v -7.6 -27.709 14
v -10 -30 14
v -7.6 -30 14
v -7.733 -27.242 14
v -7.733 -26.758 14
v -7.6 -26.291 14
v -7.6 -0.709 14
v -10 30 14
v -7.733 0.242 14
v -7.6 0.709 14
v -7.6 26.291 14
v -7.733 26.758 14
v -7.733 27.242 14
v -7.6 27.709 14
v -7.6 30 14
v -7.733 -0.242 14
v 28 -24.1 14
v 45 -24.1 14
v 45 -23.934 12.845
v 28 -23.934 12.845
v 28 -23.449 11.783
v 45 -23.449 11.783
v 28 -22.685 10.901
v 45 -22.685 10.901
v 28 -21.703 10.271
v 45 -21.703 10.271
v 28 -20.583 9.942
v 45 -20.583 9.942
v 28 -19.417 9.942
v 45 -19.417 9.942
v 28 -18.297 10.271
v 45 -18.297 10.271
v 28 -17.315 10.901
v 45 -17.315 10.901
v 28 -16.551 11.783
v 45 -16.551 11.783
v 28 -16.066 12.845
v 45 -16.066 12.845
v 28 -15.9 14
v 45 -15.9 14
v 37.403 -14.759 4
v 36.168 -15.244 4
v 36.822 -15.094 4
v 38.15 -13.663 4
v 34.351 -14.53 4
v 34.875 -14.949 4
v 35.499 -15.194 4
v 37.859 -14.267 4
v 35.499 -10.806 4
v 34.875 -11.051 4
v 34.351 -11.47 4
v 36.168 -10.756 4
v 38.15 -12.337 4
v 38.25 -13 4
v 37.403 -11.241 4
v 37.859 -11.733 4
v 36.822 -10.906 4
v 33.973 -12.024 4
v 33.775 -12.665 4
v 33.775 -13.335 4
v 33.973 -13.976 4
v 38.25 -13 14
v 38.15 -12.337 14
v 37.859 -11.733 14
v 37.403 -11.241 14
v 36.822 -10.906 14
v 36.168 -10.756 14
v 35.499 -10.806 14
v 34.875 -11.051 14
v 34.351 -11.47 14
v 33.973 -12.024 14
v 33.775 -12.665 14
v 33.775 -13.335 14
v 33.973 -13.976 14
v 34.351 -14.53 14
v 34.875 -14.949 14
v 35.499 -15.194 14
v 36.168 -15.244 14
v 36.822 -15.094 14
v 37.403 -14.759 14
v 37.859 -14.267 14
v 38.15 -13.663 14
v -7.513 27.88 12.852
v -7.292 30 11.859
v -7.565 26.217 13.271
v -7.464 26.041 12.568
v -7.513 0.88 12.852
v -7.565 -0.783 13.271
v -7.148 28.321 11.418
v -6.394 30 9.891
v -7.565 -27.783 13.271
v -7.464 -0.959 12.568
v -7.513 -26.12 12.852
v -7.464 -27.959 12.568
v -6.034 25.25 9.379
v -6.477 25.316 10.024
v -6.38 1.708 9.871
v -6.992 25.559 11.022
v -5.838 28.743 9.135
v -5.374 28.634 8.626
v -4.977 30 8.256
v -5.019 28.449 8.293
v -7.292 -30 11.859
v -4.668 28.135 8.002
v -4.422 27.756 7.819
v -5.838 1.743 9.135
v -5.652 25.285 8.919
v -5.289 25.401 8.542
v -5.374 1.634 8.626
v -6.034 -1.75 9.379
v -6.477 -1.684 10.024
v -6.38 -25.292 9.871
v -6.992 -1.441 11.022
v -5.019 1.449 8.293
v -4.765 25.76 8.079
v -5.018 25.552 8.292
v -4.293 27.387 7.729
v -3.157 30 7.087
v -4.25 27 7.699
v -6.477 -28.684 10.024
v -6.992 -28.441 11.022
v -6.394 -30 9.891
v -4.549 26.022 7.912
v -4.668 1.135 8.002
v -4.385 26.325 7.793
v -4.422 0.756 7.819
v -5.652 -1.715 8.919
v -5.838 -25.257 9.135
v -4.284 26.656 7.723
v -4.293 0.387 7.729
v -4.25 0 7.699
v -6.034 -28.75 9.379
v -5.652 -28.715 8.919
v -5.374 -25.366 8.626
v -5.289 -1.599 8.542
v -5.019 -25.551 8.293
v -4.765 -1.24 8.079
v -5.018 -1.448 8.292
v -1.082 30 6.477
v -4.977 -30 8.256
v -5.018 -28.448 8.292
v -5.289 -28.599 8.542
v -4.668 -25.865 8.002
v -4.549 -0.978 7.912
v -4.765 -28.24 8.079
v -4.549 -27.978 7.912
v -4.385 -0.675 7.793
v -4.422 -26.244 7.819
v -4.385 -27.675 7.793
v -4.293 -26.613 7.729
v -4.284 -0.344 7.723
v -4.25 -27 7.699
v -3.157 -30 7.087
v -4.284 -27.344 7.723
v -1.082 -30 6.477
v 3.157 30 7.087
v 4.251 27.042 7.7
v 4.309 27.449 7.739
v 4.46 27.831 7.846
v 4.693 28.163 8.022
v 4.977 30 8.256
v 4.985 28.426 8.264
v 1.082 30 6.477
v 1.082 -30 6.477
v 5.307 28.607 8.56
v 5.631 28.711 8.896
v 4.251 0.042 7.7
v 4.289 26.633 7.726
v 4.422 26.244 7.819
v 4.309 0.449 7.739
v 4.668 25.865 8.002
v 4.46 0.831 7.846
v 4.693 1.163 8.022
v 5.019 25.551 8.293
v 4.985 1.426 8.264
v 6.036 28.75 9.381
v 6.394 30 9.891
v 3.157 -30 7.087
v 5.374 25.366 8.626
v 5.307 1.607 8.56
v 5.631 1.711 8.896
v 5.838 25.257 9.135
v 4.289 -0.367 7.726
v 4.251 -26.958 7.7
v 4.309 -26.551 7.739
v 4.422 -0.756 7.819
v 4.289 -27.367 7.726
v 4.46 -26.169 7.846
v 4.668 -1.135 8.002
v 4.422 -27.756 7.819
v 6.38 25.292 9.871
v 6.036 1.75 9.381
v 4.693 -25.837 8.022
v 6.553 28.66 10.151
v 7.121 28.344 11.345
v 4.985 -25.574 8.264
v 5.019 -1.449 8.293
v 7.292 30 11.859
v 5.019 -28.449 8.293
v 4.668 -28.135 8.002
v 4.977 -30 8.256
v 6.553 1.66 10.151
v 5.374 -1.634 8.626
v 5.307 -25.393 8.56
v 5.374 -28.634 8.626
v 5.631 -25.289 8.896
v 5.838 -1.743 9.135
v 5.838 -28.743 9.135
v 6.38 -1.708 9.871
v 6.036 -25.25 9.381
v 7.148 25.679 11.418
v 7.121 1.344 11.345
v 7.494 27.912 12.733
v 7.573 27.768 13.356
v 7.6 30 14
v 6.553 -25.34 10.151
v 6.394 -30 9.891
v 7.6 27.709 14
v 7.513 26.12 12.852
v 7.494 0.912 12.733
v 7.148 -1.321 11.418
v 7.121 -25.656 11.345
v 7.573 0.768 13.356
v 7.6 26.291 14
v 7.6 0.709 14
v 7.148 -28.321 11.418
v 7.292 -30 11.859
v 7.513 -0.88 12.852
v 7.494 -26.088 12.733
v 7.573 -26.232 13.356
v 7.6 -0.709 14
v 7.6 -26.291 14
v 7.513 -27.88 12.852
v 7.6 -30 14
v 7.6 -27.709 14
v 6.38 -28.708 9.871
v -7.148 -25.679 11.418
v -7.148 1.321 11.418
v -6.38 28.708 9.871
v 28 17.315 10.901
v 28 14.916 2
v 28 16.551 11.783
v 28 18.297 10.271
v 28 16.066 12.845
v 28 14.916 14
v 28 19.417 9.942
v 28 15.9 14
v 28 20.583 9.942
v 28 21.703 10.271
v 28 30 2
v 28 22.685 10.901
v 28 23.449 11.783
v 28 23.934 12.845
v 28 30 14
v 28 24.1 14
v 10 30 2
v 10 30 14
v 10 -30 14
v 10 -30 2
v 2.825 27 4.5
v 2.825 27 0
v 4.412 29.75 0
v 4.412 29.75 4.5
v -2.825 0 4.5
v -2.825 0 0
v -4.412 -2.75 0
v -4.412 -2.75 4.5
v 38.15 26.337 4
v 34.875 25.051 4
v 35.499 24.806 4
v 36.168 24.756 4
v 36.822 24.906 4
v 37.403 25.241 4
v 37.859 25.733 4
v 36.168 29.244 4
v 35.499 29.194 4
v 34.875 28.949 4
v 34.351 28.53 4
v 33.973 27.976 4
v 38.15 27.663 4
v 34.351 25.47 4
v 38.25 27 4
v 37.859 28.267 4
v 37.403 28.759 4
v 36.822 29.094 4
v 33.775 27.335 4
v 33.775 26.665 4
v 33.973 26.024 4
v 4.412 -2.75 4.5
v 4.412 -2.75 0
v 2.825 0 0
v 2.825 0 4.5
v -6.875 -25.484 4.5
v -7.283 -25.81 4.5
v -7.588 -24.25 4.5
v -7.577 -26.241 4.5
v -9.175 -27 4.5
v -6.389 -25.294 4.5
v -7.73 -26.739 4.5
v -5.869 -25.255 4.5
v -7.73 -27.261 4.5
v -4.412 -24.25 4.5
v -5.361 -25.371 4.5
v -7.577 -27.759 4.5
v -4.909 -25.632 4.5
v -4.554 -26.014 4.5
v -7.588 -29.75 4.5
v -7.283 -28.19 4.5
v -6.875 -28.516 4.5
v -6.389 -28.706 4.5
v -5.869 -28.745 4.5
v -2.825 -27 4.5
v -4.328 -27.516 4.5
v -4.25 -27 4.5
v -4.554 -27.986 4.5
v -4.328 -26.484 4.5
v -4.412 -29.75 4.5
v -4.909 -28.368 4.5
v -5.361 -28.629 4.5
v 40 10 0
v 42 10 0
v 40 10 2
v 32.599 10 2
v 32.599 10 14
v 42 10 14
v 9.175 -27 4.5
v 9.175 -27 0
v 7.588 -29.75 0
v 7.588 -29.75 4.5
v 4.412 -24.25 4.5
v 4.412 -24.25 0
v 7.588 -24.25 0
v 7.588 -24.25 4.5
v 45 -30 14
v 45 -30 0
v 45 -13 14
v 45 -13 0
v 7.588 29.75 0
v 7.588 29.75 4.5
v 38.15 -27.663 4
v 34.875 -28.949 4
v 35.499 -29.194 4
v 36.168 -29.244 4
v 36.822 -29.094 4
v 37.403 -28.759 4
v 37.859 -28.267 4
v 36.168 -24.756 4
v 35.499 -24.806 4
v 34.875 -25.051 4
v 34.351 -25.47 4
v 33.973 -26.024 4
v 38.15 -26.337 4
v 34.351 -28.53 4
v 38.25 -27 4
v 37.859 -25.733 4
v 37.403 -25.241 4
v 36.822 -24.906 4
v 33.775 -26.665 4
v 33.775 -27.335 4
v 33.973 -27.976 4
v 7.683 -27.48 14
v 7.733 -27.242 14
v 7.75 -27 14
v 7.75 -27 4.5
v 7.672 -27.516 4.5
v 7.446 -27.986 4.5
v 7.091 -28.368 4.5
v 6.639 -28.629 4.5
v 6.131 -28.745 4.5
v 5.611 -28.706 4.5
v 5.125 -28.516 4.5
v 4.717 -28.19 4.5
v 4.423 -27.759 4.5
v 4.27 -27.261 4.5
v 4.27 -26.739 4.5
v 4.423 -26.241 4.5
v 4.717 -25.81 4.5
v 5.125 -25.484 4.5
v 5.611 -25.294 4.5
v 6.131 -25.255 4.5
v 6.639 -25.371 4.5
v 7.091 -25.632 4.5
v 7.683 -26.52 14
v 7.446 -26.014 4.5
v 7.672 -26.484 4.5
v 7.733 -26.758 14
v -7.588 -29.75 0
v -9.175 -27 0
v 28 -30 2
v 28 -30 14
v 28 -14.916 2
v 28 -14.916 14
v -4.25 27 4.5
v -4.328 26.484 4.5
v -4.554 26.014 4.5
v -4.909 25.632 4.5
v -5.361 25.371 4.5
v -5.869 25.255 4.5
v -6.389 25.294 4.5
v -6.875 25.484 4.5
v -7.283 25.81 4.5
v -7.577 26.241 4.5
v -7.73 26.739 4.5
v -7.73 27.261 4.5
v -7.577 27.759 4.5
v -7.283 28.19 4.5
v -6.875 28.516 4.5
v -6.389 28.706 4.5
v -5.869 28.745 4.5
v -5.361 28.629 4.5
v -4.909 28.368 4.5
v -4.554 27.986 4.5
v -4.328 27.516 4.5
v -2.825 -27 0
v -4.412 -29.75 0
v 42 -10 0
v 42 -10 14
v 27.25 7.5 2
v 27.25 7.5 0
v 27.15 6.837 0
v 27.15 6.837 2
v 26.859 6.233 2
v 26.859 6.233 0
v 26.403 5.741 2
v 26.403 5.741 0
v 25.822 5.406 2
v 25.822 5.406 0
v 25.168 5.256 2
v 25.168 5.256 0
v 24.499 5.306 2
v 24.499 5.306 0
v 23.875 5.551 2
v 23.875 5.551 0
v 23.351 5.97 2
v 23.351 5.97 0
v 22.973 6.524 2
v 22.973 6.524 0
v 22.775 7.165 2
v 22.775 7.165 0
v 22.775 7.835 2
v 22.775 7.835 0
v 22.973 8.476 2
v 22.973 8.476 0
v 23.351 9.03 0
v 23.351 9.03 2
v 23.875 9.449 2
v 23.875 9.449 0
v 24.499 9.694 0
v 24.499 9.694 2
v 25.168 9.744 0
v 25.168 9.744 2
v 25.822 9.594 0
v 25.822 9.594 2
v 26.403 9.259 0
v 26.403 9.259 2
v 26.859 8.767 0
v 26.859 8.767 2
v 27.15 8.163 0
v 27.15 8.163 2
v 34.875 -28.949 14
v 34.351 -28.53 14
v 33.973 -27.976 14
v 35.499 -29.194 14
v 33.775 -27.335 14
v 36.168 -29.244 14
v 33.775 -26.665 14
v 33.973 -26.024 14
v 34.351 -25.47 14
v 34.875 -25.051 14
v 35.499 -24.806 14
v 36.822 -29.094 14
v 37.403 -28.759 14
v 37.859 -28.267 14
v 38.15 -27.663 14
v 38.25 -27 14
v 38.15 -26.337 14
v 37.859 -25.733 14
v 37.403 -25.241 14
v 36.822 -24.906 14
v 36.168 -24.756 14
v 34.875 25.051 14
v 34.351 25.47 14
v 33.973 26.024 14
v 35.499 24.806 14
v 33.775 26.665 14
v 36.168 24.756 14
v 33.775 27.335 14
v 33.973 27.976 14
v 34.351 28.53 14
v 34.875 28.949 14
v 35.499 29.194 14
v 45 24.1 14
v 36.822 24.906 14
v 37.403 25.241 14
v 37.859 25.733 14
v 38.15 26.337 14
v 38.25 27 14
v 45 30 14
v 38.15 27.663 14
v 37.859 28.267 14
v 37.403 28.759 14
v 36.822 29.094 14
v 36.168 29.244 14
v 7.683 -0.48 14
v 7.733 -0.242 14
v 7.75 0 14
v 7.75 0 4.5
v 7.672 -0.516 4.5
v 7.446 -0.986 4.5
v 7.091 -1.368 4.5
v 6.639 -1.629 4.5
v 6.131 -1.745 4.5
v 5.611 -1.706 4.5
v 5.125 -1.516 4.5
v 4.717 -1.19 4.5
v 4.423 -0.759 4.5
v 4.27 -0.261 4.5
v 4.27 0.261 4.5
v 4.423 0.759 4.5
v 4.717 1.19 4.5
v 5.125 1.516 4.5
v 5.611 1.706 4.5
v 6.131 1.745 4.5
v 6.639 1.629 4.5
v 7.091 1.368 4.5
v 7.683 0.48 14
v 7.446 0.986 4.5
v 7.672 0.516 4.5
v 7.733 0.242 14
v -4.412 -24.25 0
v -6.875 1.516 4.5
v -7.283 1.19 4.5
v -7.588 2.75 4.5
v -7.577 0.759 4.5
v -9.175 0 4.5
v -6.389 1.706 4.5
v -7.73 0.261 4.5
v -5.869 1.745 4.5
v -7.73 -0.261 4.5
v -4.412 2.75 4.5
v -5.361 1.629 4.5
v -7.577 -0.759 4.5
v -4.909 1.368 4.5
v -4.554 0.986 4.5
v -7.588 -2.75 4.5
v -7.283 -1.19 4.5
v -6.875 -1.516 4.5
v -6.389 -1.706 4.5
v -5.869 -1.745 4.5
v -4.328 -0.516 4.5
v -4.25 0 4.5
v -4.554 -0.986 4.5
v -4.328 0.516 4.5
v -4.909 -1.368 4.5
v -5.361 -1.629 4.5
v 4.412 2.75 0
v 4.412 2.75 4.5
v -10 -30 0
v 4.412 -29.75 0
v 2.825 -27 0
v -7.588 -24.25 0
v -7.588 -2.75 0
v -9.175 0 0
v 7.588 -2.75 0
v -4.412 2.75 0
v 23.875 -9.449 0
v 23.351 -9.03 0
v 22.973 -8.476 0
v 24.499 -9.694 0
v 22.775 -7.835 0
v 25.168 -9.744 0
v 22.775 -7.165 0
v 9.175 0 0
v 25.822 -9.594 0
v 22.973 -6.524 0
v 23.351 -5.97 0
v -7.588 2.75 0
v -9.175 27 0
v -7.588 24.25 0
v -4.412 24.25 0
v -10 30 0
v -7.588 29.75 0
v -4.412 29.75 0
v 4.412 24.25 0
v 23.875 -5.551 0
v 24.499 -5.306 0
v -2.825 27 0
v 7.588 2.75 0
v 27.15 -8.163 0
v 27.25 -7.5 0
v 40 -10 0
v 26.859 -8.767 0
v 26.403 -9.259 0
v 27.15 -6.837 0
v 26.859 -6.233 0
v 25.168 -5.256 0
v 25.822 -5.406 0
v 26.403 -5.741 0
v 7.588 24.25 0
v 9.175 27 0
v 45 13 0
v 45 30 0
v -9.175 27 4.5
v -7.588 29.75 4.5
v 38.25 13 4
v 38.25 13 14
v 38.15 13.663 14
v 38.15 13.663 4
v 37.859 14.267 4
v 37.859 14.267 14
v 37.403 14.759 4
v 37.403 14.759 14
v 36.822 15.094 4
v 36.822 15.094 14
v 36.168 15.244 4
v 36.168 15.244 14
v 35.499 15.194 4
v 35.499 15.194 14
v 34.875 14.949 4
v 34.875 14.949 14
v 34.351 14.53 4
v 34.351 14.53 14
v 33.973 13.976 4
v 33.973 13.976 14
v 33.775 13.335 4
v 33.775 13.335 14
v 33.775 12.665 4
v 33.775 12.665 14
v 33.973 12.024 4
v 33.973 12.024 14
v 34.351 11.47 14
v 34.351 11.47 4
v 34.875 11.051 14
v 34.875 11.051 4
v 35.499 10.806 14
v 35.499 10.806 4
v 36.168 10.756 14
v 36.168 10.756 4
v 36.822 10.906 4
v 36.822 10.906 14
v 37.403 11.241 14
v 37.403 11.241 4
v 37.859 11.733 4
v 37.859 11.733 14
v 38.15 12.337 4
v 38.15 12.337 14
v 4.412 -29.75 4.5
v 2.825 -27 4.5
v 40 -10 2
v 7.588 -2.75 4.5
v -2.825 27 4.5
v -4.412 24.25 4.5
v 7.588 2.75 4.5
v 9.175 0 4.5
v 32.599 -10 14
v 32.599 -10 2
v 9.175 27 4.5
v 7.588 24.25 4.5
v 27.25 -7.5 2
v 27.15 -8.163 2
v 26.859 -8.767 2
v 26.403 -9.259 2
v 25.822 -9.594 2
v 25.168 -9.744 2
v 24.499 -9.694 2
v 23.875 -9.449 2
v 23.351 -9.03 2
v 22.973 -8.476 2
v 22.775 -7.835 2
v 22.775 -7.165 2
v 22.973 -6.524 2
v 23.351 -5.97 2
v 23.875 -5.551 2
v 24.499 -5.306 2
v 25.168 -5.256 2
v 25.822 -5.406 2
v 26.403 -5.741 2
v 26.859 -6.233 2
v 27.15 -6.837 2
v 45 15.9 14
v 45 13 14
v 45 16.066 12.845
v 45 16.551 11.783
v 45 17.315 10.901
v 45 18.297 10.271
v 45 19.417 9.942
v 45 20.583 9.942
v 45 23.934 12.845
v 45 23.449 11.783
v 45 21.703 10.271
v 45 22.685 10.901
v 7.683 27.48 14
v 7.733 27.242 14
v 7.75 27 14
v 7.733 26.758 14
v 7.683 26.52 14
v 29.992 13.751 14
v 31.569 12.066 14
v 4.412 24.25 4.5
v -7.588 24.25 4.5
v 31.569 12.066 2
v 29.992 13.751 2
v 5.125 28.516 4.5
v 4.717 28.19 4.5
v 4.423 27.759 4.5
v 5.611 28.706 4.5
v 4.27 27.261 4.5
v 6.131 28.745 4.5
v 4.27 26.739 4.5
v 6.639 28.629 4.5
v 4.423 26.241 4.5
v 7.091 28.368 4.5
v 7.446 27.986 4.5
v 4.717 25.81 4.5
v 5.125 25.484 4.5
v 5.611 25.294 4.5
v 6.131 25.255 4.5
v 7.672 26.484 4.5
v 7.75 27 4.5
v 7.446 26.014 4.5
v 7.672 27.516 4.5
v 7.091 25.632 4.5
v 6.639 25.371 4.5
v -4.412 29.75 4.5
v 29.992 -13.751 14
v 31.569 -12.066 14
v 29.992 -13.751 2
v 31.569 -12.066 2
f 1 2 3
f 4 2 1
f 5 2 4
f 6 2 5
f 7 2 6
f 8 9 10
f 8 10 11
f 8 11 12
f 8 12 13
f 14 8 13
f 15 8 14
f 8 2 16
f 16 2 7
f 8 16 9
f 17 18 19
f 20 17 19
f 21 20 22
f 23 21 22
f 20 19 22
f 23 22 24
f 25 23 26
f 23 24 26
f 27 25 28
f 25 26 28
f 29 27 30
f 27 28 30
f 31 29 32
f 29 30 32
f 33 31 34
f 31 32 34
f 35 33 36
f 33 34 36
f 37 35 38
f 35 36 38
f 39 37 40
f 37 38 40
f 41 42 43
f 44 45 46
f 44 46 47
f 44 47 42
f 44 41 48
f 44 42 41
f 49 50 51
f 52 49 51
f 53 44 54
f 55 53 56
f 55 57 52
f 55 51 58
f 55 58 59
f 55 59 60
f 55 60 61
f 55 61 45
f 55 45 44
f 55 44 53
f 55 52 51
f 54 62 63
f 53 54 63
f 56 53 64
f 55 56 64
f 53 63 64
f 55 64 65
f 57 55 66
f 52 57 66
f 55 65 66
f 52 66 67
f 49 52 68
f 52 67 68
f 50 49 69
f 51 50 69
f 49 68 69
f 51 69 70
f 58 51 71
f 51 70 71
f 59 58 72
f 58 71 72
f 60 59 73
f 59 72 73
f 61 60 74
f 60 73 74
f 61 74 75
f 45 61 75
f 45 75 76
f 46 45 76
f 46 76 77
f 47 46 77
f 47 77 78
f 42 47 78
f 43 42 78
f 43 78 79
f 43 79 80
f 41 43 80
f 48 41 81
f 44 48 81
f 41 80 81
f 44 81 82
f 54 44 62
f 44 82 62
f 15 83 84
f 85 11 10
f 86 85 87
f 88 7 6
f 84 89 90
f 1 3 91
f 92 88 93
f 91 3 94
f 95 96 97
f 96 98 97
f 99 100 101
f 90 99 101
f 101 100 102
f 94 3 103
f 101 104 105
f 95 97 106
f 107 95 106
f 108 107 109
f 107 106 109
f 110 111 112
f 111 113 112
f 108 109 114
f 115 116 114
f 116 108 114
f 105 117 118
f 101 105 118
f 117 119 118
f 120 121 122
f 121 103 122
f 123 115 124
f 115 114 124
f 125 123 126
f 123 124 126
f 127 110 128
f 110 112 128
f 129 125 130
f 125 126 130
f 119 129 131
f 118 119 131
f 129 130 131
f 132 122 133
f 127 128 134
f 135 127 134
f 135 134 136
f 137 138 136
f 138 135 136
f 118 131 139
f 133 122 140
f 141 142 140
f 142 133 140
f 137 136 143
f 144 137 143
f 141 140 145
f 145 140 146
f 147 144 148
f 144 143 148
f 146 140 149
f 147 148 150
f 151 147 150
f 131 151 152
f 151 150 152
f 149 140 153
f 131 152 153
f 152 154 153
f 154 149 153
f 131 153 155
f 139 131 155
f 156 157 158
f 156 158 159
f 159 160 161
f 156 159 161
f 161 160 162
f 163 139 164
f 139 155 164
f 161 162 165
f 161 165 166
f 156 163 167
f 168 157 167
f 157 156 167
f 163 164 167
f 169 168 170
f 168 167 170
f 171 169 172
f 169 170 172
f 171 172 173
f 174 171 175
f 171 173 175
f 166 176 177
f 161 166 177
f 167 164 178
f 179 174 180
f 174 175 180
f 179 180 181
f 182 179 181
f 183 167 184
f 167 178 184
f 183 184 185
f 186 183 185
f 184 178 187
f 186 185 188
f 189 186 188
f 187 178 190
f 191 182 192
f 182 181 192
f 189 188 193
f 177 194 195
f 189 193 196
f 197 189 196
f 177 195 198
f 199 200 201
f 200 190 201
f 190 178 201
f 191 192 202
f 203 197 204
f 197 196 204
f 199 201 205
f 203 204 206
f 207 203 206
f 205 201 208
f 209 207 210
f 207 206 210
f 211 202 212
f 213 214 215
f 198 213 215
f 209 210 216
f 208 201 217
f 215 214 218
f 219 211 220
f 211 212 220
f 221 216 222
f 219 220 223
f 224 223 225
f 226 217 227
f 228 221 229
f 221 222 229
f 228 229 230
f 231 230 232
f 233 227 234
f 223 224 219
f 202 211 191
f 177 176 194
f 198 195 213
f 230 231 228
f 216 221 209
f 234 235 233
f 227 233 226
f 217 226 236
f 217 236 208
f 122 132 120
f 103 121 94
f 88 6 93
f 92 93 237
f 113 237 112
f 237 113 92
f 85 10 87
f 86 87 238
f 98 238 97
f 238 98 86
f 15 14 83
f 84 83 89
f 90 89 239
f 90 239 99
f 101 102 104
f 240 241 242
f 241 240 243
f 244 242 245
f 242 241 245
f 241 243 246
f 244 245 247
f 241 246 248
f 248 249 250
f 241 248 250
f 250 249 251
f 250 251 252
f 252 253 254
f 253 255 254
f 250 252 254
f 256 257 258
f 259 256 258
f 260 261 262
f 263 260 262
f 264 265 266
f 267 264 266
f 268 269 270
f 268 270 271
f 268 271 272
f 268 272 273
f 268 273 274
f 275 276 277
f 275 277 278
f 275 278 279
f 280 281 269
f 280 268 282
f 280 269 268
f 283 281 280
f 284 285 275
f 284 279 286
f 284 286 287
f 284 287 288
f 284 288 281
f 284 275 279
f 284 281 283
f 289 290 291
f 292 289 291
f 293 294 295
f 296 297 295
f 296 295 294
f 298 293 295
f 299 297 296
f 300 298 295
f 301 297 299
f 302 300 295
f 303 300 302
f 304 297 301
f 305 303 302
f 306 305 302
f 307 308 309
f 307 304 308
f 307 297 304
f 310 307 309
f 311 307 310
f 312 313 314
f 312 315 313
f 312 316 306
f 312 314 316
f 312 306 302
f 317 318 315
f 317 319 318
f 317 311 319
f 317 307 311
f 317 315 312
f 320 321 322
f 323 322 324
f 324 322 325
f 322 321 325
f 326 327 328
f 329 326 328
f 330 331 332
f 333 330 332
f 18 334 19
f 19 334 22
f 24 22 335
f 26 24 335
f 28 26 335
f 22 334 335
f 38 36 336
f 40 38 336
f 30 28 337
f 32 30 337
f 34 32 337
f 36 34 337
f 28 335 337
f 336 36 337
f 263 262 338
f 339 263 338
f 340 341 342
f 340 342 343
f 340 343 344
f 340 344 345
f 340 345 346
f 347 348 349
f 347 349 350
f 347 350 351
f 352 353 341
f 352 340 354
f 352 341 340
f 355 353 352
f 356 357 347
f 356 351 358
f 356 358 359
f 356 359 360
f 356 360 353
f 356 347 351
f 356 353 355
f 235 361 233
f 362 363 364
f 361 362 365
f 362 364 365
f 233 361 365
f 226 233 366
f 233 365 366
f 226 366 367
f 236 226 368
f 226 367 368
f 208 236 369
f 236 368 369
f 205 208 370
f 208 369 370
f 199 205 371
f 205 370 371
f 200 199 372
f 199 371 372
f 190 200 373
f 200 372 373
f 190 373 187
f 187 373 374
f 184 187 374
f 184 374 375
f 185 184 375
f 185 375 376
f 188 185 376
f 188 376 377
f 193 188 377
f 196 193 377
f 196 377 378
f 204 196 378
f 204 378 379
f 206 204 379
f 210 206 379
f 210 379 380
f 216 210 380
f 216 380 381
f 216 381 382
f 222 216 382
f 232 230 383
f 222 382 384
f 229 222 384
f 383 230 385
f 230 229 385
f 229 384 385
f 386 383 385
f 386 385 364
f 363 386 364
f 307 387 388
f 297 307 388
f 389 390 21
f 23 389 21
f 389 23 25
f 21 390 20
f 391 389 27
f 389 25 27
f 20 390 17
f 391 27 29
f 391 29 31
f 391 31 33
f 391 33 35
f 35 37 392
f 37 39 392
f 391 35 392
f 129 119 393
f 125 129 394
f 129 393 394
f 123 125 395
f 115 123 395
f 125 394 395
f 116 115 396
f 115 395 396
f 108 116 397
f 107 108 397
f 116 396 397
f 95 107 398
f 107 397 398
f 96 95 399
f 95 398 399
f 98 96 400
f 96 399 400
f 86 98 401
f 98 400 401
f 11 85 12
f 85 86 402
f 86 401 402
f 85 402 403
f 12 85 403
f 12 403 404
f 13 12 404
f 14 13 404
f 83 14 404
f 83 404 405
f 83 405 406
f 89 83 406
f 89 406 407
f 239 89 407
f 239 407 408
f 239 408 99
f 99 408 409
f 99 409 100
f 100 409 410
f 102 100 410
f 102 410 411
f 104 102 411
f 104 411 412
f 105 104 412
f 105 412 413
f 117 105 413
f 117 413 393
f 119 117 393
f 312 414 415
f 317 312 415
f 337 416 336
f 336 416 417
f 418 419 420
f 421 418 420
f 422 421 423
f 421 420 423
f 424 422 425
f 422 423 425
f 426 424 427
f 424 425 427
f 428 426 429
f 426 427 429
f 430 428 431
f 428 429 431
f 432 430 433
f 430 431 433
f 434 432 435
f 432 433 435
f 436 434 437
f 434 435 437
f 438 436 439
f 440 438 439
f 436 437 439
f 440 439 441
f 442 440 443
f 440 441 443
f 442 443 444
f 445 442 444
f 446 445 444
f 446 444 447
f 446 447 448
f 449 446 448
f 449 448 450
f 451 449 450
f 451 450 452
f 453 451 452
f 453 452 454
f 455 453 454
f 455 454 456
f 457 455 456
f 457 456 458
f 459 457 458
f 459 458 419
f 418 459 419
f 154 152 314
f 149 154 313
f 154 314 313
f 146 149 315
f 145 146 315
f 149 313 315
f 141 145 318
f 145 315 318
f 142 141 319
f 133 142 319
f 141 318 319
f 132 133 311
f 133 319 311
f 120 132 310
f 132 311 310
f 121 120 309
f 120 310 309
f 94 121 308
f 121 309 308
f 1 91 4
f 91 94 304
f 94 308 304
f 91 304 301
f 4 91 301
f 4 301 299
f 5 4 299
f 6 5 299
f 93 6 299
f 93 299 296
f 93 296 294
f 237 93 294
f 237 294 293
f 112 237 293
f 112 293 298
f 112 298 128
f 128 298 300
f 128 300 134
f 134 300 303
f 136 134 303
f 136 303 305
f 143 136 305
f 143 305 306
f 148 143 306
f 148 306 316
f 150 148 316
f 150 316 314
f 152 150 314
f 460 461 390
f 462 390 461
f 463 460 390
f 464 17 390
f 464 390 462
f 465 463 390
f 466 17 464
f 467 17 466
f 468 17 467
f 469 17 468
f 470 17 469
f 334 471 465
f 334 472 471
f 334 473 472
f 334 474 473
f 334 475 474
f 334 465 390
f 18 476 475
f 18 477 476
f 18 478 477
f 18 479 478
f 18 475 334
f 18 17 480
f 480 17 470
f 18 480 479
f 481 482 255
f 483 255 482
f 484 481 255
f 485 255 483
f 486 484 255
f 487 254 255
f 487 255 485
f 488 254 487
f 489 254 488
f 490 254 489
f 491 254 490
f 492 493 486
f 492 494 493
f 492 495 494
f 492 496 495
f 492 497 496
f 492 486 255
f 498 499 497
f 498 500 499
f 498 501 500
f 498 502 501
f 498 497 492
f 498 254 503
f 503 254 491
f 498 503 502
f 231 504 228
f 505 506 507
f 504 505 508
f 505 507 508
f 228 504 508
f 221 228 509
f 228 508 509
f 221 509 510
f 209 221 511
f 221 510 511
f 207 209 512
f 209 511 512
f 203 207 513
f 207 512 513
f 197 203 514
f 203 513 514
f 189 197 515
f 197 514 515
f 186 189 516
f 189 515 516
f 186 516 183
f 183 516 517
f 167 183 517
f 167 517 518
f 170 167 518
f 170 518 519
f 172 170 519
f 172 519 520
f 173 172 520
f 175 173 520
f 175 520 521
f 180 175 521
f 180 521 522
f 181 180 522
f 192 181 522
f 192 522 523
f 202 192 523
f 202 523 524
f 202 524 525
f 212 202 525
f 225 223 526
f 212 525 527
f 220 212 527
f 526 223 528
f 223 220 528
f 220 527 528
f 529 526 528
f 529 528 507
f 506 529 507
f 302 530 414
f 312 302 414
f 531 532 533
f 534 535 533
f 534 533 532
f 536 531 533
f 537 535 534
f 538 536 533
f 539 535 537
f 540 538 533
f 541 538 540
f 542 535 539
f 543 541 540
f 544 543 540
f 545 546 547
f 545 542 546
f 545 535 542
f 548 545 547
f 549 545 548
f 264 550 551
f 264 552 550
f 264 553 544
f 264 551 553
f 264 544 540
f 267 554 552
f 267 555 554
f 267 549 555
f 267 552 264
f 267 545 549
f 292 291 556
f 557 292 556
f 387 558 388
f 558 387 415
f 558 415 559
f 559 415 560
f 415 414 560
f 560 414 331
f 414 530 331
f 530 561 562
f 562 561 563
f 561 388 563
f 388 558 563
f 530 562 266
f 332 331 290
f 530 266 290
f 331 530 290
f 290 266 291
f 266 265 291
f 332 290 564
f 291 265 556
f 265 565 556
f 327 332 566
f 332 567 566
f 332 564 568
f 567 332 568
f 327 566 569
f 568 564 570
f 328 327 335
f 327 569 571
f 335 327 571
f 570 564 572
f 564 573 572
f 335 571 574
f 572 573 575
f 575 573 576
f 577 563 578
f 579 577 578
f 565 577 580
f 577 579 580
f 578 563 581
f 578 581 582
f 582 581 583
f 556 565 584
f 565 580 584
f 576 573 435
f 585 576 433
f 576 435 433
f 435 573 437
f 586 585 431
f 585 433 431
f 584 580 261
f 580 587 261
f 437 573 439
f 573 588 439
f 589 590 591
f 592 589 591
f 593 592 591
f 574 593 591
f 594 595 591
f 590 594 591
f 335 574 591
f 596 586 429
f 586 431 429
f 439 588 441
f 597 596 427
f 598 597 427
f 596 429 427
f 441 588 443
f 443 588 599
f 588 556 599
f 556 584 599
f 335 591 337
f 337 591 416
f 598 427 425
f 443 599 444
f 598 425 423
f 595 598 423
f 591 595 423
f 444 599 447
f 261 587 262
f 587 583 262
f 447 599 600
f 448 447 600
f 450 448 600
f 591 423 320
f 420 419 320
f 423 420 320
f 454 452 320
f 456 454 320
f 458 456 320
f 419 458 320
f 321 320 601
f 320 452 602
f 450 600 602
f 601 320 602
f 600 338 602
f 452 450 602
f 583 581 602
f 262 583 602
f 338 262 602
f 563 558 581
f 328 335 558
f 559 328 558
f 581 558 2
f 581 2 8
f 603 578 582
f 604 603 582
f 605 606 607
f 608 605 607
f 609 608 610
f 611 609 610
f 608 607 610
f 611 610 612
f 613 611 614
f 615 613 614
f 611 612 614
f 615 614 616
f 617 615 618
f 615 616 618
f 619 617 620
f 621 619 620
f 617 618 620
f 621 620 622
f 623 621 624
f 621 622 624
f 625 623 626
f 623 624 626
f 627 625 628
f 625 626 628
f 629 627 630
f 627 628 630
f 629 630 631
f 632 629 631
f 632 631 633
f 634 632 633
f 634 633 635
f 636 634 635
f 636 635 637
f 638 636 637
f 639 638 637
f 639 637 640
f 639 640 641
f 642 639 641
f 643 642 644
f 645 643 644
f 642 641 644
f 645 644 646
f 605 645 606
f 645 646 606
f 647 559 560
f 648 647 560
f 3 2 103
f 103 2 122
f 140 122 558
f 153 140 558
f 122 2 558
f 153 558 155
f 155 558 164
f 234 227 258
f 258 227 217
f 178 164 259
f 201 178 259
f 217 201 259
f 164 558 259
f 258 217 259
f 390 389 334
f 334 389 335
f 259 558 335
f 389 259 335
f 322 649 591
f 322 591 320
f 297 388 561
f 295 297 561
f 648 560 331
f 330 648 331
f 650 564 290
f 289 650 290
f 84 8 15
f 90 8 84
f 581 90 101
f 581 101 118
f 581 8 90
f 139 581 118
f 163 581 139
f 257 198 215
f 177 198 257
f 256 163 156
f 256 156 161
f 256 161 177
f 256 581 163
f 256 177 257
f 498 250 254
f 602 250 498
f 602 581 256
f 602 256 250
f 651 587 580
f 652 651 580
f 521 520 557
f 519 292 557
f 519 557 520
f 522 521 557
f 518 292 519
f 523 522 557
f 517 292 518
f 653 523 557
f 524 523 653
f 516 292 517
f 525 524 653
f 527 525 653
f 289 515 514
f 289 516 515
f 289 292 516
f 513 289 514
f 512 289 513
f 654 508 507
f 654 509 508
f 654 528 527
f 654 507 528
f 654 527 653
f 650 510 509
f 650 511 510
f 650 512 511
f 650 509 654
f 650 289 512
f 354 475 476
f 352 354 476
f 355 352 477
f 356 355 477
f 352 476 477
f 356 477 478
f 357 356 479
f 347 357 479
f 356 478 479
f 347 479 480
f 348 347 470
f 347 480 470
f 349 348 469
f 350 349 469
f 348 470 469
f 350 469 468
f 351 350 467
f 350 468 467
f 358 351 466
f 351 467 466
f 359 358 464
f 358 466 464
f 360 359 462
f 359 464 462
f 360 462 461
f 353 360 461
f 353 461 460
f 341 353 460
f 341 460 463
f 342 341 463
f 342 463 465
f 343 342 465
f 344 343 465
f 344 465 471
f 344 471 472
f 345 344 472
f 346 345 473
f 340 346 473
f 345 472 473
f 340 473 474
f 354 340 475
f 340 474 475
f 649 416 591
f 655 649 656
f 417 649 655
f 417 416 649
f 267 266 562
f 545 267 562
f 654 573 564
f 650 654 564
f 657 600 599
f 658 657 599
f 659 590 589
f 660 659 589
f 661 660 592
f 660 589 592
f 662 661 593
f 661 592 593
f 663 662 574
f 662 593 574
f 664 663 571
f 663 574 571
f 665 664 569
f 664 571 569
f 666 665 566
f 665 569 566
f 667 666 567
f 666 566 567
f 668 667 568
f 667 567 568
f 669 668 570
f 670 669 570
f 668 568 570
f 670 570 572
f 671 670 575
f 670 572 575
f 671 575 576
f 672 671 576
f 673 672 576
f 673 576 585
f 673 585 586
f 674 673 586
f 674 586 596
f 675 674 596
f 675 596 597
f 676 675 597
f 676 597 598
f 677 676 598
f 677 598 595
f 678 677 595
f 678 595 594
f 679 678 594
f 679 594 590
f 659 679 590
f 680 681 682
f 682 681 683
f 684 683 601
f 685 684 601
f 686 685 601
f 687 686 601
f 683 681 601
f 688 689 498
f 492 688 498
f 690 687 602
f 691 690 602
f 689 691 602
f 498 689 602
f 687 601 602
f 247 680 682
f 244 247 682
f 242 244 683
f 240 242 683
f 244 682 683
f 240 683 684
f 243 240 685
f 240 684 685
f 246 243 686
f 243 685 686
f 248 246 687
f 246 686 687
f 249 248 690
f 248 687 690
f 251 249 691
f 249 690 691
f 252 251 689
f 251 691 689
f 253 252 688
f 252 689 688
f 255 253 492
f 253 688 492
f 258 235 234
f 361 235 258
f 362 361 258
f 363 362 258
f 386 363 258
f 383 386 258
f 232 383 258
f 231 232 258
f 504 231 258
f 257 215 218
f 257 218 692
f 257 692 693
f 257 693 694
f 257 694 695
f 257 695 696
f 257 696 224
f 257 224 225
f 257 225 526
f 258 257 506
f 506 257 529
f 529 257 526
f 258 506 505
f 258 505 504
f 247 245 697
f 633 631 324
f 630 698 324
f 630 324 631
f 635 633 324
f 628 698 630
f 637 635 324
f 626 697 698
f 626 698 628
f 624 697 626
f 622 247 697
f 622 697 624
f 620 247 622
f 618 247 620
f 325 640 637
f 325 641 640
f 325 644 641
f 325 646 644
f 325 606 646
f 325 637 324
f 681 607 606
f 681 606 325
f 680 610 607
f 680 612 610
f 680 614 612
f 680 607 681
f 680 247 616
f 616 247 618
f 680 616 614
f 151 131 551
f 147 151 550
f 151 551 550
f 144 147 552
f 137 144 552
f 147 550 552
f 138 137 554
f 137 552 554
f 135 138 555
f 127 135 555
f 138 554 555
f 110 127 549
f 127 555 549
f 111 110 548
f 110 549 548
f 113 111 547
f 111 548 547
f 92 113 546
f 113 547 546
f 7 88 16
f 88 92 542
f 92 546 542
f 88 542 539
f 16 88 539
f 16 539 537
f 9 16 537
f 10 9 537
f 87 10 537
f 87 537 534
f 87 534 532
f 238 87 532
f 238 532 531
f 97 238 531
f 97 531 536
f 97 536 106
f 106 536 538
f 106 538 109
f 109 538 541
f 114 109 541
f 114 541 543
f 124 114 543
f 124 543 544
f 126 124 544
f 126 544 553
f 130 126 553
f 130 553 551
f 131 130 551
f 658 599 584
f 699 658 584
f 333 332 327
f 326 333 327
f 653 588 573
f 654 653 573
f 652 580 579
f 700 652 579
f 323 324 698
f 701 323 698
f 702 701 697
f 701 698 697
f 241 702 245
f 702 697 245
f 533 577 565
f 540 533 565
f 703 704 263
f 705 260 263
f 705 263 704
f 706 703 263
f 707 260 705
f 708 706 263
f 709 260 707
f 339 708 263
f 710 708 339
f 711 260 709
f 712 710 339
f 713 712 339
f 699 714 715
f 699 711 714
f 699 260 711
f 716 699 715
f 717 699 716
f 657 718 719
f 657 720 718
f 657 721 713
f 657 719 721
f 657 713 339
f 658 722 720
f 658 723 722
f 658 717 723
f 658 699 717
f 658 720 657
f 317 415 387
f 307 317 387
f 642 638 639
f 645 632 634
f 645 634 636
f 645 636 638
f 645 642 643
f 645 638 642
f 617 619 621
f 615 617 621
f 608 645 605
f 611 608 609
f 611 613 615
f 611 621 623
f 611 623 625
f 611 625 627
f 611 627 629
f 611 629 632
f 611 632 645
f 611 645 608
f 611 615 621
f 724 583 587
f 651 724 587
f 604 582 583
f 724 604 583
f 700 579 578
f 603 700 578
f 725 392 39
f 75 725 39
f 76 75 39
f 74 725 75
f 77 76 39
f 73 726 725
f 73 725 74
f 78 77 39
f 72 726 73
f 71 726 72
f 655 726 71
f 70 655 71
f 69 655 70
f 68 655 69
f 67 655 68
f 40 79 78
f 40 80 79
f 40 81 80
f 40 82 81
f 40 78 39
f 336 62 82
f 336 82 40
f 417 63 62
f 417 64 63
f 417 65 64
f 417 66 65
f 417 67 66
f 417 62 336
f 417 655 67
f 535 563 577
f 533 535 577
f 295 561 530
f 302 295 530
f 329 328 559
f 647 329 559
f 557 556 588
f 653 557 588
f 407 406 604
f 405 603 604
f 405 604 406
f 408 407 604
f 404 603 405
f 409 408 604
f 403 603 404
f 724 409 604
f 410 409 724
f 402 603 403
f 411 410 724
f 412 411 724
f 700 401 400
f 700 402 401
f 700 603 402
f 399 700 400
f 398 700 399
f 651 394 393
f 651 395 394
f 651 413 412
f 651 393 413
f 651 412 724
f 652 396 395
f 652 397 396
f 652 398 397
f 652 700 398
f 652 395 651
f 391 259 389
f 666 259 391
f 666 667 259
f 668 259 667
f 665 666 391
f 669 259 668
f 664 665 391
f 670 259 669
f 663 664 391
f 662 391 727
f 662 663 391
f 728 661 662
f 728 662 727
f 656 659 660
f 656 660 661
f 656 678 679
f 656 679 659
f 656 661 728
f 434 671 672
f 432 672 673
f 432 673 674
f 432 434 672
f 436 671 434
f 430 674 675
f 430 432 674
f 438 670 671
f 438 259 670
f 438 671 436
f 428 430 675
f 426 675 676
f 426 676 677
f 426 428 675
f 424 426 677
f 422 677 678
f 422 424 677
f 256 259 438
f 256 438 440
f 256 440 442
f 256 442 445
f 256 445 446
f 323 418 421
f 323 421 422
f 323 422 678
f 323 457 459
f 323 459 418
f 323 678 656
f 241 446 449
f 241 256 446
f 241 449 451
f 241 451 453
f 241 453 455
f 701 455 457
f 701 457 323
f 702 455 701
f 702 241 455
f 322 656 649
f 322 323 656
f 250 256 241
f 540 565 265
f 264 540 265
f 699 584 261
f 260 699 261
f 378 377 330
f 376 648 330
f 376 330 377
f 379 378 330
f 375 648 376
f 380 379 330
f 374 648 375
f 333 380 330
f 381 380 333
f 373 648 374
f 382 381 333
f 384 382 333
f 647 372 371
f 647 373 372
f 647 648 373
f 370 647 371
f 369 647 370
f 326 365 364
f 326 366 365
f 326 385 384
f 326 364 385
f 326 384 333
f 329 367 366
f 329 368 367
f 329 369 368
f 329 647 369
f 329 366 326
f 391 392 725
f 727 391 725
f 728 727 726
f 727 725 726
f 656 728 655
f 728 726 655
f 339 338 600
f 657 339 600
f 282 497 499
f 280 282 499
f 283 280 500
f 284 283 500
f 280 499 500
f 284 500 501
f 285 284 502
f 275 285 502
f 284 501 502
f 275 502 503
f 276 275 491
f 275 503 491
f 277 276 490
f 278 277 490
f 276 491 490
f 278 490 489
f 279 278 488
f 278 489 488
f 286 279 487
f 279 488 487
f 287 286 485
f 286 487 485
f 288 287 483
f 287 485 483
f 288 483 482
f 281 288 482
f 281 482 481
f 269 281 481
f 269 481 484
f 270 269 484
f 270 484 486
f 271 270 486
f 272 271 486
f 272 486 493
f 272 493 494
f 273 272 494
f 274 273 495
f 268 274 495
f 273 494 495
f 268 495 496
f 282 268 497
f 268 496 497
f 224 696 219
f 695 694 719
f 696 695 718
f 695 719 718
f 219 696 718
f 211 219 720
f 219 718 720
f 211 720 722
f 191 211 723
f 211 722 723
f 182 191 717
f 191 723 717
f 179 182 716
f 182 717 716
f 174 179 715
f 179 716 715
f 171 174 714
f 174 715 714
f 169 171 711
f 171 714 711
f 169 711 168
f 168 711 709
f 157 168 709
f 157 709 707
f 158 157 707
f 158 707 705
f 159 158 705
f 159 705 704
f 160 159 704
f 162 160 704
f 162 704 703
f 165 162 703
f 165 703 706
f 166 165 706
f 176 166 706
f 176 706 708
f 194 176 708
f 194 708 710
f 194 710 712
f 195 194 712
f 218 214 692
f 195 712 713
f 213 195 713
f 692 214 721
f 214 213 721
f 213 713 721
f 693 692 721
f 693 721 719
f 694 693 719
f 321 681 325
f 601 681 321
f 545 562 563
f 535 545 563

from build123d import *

# Parameters (mm, degrees)
SKETCH_W        = 55
SKETCH_H        = 60
PAD_DEPTH       = 14
SKETCH001_R     = 7.6
POCKET_DEPTH    = 60.001
SKETCH002_R     = 1.75
POCKET001_DEPTH = 14.001
POCKET002_DEPTH = 12
SKETCH004_R     = 2.25
POCKET003_DEPTH = 14.001
SKETCH008_R     = 4.1
POCKET005_DEPTH = 20
SKETCH010_W     = 20
SKETCH010_H     = 25
POCKET006_DEPTH = 5
SKETCH011_R     = 2.25
POCKET007_DEPTH = 10
CHAMFER_SIZE    = 3
CHAMFER001_SIZE = 3
POCKET008_DEPTH = 4.5


with BuildPart() as part:
    # Sketch → Pad (new body)
    with BuildSketch(Plane.XY):
        with Locations((17.5, 0)):
            Rectangle(SKETCH_W, SKETCH_H)
    extrude(amount=PAD_DEPTH)

    # Sketch001 → Pocket (cut, through all)
    with BuildSketch(Plane.XZ.offset(30)):
        with Locations((0, 14)):
            Circle(SKETCH001_R)
    extrude(amount=-POCKET_DEPTH, mode=Mode.SUBTRACT)

    # Sketch002 → Pocket001 (cut, through all)
    with BuildSketch(Plane(origin=(0, 0, 0), x_dir=(1, 0, 0), z_dir=(0, 0, -1))):
        with Locations((-6, 27)):
            Circle(SKETCH002_R)
        with Locations((-6, -27)):
            Circle(SKETCH002_R)
        with Locations((6, 27)):
            Circle(SKETCH002_R)
        with Locations((6, -27)):
            Circle(SKETCH002_R)
        with Locations((6, 0)):
            Circle(SKETCH002_R)
        with Locations((-6, 0)):
            Circle(SKETCH002_R)
    extrude(amount=-POCKET001_DEPTH, mode=Mode.SUBTRACT)

    # Sketch003 → Pocket002 (cut)
    with BuildSketch(Plane.XY.offset(14)):
        with BuildLine():
            Line((10, 35), (10, -35))
            Line((10, -35), (28, -35))
            Line((28, -35), (28, -14.916198))
            ThreePointArc((28, -14.916198), (30.841983, -12.965458), (32.599342, -10))
            Line((32.599342, -10), (52.599342, -10))
            Line((52.599342, -10), (52.599342, 10))
            Line((52.599342, 10), (32.599342, 10))
            ThreePointArc((32.599342, 10), (30.841983, 12.965458), (28, 14.916198))
            Line((28, 14.916198), (28, 35))
            Line((28, 35), (10, 35))
        make_face()
    extrude(amount=-POCKET002_DEPTH, mode=Mode.SUBTRACT)

    # Sketch004 → Pocket003 (cut, through all)
    with BuildSketch(Plane(origin=(0, 0, 0), x_dir=(1, 0, 0), z_dir=(0, 0, -1))):
        with Locations((25, 7.5)):
            Circle(SKETCH004_R)
        with Locations((25, -7.5)):
            Circle(SKETCH004_R)
    extrude(amount=-POCKET003_DEPTH, mode=Mode.SUBTRACT)

    # Sketch008 → Pocket005 (cut)
    with BuildSketch(Plane.YZ.offset(45)):
        with Locations((-20, 14)):
            Circle(SKETCH008_R)
        with Locations((20, 14)):
            Circle(SKETCH008_R)
    extrude(amount=-POCKET005_DEPTH, mode=Mode.SUBTRACT)

    # Sketch010 → Pocket006 (cut)
    with BuildSketch(Plane.YZ.offset(45)):
        with Locations((0, 6.5)):
            Rectangle(SKETCH010_W, SKETCH010_H)
    extrude(amount=-POCKET006_DEPTH, mode=Mode.SUBTRACT)

    # Sketch011 → Pocket007 (cut)
    with BuildSketch(Plane.XY.offset(14)):
        with Locations((36, 27)):
            Circle(SKETCH011_R)
        with Locations((36, 13)):
            Circle(SKETCH011_R)
        with Locations((36, -13)):
            Circle(SKETCH011_R)
        with Locations((36, -27)):
            Circle(SKETCH011_R)
    extrude(amount=-POCKET007_DEPTH, mode=Mode.SUBTRACT)

    # Chamfer
    chamfer_edges = [part.edges().sort_by_distance(p)[0] for p in [
        (45, -10, 8),
        (45, -10, 1),
    ]]
    chamfer(chamfer_edges, length=CHAMFER_SIZE)

    # Chamfer001
    chamfer001_edges = [part.edges().sort_by_distance(p)[0] for p in [
        (45, 10, 8),
        (45, 10, 1),
    ]]
    chamfer(chamfer001_edges, length=CHAMFER001_SIZE)

    # Sketch012 → Pocket008 (cut)
    with BuildSketch(Plane(origin=(0, 0, 0), x_dir=(1, 0, 0), z_dir=(0, 0, -1))):
        Polygon((-4.412285, 29.750003), (-7.587715, 29.750003), (-9.17543, 27), (-7.587715, 24.249997), (-4.412285, 24.249997), (-2.82457, 27), align=None)
        Polygon((7.587715, 29.750003), (4.412285, 29.750003), (2.82457, 27), (4.412285, 24.249997), (7.587715, 24.249997), (9.17543, 27), align=None)
        Polygon((-4.412285, 2.750003), (-7.587715, 2.750003), (-9.17543, 0), (-7.587715, -2.750003), (-4.412285, -2.750003), (-2.82457, 0), align=None)
        Polygon((7.587715, 2.750003), (4.412285, 2.750003), (2.82457, 0), (4.412285, -2.750003), (7.587715, -2.750003), (9.17543, 0), align=None)
        Polygon((-4.412285, -24.249997), (-7.587715, -24.249997), (-9.17543, -27), (-7.587715, -29.750003), (-4.412285, -29.750003), (-2.82457, -27), align=None)
        Polygon((7.587715, -24.249997), (4.412285, -24.249997), (2.82457, -27), (4.412285, -29.750003), (7.587715, -29.750003), (9.17543, -27), align=None)
    extrude(amount=-POCKET008_DEPTH, mode=Mode.SUBTRACT)


solid = part.part
